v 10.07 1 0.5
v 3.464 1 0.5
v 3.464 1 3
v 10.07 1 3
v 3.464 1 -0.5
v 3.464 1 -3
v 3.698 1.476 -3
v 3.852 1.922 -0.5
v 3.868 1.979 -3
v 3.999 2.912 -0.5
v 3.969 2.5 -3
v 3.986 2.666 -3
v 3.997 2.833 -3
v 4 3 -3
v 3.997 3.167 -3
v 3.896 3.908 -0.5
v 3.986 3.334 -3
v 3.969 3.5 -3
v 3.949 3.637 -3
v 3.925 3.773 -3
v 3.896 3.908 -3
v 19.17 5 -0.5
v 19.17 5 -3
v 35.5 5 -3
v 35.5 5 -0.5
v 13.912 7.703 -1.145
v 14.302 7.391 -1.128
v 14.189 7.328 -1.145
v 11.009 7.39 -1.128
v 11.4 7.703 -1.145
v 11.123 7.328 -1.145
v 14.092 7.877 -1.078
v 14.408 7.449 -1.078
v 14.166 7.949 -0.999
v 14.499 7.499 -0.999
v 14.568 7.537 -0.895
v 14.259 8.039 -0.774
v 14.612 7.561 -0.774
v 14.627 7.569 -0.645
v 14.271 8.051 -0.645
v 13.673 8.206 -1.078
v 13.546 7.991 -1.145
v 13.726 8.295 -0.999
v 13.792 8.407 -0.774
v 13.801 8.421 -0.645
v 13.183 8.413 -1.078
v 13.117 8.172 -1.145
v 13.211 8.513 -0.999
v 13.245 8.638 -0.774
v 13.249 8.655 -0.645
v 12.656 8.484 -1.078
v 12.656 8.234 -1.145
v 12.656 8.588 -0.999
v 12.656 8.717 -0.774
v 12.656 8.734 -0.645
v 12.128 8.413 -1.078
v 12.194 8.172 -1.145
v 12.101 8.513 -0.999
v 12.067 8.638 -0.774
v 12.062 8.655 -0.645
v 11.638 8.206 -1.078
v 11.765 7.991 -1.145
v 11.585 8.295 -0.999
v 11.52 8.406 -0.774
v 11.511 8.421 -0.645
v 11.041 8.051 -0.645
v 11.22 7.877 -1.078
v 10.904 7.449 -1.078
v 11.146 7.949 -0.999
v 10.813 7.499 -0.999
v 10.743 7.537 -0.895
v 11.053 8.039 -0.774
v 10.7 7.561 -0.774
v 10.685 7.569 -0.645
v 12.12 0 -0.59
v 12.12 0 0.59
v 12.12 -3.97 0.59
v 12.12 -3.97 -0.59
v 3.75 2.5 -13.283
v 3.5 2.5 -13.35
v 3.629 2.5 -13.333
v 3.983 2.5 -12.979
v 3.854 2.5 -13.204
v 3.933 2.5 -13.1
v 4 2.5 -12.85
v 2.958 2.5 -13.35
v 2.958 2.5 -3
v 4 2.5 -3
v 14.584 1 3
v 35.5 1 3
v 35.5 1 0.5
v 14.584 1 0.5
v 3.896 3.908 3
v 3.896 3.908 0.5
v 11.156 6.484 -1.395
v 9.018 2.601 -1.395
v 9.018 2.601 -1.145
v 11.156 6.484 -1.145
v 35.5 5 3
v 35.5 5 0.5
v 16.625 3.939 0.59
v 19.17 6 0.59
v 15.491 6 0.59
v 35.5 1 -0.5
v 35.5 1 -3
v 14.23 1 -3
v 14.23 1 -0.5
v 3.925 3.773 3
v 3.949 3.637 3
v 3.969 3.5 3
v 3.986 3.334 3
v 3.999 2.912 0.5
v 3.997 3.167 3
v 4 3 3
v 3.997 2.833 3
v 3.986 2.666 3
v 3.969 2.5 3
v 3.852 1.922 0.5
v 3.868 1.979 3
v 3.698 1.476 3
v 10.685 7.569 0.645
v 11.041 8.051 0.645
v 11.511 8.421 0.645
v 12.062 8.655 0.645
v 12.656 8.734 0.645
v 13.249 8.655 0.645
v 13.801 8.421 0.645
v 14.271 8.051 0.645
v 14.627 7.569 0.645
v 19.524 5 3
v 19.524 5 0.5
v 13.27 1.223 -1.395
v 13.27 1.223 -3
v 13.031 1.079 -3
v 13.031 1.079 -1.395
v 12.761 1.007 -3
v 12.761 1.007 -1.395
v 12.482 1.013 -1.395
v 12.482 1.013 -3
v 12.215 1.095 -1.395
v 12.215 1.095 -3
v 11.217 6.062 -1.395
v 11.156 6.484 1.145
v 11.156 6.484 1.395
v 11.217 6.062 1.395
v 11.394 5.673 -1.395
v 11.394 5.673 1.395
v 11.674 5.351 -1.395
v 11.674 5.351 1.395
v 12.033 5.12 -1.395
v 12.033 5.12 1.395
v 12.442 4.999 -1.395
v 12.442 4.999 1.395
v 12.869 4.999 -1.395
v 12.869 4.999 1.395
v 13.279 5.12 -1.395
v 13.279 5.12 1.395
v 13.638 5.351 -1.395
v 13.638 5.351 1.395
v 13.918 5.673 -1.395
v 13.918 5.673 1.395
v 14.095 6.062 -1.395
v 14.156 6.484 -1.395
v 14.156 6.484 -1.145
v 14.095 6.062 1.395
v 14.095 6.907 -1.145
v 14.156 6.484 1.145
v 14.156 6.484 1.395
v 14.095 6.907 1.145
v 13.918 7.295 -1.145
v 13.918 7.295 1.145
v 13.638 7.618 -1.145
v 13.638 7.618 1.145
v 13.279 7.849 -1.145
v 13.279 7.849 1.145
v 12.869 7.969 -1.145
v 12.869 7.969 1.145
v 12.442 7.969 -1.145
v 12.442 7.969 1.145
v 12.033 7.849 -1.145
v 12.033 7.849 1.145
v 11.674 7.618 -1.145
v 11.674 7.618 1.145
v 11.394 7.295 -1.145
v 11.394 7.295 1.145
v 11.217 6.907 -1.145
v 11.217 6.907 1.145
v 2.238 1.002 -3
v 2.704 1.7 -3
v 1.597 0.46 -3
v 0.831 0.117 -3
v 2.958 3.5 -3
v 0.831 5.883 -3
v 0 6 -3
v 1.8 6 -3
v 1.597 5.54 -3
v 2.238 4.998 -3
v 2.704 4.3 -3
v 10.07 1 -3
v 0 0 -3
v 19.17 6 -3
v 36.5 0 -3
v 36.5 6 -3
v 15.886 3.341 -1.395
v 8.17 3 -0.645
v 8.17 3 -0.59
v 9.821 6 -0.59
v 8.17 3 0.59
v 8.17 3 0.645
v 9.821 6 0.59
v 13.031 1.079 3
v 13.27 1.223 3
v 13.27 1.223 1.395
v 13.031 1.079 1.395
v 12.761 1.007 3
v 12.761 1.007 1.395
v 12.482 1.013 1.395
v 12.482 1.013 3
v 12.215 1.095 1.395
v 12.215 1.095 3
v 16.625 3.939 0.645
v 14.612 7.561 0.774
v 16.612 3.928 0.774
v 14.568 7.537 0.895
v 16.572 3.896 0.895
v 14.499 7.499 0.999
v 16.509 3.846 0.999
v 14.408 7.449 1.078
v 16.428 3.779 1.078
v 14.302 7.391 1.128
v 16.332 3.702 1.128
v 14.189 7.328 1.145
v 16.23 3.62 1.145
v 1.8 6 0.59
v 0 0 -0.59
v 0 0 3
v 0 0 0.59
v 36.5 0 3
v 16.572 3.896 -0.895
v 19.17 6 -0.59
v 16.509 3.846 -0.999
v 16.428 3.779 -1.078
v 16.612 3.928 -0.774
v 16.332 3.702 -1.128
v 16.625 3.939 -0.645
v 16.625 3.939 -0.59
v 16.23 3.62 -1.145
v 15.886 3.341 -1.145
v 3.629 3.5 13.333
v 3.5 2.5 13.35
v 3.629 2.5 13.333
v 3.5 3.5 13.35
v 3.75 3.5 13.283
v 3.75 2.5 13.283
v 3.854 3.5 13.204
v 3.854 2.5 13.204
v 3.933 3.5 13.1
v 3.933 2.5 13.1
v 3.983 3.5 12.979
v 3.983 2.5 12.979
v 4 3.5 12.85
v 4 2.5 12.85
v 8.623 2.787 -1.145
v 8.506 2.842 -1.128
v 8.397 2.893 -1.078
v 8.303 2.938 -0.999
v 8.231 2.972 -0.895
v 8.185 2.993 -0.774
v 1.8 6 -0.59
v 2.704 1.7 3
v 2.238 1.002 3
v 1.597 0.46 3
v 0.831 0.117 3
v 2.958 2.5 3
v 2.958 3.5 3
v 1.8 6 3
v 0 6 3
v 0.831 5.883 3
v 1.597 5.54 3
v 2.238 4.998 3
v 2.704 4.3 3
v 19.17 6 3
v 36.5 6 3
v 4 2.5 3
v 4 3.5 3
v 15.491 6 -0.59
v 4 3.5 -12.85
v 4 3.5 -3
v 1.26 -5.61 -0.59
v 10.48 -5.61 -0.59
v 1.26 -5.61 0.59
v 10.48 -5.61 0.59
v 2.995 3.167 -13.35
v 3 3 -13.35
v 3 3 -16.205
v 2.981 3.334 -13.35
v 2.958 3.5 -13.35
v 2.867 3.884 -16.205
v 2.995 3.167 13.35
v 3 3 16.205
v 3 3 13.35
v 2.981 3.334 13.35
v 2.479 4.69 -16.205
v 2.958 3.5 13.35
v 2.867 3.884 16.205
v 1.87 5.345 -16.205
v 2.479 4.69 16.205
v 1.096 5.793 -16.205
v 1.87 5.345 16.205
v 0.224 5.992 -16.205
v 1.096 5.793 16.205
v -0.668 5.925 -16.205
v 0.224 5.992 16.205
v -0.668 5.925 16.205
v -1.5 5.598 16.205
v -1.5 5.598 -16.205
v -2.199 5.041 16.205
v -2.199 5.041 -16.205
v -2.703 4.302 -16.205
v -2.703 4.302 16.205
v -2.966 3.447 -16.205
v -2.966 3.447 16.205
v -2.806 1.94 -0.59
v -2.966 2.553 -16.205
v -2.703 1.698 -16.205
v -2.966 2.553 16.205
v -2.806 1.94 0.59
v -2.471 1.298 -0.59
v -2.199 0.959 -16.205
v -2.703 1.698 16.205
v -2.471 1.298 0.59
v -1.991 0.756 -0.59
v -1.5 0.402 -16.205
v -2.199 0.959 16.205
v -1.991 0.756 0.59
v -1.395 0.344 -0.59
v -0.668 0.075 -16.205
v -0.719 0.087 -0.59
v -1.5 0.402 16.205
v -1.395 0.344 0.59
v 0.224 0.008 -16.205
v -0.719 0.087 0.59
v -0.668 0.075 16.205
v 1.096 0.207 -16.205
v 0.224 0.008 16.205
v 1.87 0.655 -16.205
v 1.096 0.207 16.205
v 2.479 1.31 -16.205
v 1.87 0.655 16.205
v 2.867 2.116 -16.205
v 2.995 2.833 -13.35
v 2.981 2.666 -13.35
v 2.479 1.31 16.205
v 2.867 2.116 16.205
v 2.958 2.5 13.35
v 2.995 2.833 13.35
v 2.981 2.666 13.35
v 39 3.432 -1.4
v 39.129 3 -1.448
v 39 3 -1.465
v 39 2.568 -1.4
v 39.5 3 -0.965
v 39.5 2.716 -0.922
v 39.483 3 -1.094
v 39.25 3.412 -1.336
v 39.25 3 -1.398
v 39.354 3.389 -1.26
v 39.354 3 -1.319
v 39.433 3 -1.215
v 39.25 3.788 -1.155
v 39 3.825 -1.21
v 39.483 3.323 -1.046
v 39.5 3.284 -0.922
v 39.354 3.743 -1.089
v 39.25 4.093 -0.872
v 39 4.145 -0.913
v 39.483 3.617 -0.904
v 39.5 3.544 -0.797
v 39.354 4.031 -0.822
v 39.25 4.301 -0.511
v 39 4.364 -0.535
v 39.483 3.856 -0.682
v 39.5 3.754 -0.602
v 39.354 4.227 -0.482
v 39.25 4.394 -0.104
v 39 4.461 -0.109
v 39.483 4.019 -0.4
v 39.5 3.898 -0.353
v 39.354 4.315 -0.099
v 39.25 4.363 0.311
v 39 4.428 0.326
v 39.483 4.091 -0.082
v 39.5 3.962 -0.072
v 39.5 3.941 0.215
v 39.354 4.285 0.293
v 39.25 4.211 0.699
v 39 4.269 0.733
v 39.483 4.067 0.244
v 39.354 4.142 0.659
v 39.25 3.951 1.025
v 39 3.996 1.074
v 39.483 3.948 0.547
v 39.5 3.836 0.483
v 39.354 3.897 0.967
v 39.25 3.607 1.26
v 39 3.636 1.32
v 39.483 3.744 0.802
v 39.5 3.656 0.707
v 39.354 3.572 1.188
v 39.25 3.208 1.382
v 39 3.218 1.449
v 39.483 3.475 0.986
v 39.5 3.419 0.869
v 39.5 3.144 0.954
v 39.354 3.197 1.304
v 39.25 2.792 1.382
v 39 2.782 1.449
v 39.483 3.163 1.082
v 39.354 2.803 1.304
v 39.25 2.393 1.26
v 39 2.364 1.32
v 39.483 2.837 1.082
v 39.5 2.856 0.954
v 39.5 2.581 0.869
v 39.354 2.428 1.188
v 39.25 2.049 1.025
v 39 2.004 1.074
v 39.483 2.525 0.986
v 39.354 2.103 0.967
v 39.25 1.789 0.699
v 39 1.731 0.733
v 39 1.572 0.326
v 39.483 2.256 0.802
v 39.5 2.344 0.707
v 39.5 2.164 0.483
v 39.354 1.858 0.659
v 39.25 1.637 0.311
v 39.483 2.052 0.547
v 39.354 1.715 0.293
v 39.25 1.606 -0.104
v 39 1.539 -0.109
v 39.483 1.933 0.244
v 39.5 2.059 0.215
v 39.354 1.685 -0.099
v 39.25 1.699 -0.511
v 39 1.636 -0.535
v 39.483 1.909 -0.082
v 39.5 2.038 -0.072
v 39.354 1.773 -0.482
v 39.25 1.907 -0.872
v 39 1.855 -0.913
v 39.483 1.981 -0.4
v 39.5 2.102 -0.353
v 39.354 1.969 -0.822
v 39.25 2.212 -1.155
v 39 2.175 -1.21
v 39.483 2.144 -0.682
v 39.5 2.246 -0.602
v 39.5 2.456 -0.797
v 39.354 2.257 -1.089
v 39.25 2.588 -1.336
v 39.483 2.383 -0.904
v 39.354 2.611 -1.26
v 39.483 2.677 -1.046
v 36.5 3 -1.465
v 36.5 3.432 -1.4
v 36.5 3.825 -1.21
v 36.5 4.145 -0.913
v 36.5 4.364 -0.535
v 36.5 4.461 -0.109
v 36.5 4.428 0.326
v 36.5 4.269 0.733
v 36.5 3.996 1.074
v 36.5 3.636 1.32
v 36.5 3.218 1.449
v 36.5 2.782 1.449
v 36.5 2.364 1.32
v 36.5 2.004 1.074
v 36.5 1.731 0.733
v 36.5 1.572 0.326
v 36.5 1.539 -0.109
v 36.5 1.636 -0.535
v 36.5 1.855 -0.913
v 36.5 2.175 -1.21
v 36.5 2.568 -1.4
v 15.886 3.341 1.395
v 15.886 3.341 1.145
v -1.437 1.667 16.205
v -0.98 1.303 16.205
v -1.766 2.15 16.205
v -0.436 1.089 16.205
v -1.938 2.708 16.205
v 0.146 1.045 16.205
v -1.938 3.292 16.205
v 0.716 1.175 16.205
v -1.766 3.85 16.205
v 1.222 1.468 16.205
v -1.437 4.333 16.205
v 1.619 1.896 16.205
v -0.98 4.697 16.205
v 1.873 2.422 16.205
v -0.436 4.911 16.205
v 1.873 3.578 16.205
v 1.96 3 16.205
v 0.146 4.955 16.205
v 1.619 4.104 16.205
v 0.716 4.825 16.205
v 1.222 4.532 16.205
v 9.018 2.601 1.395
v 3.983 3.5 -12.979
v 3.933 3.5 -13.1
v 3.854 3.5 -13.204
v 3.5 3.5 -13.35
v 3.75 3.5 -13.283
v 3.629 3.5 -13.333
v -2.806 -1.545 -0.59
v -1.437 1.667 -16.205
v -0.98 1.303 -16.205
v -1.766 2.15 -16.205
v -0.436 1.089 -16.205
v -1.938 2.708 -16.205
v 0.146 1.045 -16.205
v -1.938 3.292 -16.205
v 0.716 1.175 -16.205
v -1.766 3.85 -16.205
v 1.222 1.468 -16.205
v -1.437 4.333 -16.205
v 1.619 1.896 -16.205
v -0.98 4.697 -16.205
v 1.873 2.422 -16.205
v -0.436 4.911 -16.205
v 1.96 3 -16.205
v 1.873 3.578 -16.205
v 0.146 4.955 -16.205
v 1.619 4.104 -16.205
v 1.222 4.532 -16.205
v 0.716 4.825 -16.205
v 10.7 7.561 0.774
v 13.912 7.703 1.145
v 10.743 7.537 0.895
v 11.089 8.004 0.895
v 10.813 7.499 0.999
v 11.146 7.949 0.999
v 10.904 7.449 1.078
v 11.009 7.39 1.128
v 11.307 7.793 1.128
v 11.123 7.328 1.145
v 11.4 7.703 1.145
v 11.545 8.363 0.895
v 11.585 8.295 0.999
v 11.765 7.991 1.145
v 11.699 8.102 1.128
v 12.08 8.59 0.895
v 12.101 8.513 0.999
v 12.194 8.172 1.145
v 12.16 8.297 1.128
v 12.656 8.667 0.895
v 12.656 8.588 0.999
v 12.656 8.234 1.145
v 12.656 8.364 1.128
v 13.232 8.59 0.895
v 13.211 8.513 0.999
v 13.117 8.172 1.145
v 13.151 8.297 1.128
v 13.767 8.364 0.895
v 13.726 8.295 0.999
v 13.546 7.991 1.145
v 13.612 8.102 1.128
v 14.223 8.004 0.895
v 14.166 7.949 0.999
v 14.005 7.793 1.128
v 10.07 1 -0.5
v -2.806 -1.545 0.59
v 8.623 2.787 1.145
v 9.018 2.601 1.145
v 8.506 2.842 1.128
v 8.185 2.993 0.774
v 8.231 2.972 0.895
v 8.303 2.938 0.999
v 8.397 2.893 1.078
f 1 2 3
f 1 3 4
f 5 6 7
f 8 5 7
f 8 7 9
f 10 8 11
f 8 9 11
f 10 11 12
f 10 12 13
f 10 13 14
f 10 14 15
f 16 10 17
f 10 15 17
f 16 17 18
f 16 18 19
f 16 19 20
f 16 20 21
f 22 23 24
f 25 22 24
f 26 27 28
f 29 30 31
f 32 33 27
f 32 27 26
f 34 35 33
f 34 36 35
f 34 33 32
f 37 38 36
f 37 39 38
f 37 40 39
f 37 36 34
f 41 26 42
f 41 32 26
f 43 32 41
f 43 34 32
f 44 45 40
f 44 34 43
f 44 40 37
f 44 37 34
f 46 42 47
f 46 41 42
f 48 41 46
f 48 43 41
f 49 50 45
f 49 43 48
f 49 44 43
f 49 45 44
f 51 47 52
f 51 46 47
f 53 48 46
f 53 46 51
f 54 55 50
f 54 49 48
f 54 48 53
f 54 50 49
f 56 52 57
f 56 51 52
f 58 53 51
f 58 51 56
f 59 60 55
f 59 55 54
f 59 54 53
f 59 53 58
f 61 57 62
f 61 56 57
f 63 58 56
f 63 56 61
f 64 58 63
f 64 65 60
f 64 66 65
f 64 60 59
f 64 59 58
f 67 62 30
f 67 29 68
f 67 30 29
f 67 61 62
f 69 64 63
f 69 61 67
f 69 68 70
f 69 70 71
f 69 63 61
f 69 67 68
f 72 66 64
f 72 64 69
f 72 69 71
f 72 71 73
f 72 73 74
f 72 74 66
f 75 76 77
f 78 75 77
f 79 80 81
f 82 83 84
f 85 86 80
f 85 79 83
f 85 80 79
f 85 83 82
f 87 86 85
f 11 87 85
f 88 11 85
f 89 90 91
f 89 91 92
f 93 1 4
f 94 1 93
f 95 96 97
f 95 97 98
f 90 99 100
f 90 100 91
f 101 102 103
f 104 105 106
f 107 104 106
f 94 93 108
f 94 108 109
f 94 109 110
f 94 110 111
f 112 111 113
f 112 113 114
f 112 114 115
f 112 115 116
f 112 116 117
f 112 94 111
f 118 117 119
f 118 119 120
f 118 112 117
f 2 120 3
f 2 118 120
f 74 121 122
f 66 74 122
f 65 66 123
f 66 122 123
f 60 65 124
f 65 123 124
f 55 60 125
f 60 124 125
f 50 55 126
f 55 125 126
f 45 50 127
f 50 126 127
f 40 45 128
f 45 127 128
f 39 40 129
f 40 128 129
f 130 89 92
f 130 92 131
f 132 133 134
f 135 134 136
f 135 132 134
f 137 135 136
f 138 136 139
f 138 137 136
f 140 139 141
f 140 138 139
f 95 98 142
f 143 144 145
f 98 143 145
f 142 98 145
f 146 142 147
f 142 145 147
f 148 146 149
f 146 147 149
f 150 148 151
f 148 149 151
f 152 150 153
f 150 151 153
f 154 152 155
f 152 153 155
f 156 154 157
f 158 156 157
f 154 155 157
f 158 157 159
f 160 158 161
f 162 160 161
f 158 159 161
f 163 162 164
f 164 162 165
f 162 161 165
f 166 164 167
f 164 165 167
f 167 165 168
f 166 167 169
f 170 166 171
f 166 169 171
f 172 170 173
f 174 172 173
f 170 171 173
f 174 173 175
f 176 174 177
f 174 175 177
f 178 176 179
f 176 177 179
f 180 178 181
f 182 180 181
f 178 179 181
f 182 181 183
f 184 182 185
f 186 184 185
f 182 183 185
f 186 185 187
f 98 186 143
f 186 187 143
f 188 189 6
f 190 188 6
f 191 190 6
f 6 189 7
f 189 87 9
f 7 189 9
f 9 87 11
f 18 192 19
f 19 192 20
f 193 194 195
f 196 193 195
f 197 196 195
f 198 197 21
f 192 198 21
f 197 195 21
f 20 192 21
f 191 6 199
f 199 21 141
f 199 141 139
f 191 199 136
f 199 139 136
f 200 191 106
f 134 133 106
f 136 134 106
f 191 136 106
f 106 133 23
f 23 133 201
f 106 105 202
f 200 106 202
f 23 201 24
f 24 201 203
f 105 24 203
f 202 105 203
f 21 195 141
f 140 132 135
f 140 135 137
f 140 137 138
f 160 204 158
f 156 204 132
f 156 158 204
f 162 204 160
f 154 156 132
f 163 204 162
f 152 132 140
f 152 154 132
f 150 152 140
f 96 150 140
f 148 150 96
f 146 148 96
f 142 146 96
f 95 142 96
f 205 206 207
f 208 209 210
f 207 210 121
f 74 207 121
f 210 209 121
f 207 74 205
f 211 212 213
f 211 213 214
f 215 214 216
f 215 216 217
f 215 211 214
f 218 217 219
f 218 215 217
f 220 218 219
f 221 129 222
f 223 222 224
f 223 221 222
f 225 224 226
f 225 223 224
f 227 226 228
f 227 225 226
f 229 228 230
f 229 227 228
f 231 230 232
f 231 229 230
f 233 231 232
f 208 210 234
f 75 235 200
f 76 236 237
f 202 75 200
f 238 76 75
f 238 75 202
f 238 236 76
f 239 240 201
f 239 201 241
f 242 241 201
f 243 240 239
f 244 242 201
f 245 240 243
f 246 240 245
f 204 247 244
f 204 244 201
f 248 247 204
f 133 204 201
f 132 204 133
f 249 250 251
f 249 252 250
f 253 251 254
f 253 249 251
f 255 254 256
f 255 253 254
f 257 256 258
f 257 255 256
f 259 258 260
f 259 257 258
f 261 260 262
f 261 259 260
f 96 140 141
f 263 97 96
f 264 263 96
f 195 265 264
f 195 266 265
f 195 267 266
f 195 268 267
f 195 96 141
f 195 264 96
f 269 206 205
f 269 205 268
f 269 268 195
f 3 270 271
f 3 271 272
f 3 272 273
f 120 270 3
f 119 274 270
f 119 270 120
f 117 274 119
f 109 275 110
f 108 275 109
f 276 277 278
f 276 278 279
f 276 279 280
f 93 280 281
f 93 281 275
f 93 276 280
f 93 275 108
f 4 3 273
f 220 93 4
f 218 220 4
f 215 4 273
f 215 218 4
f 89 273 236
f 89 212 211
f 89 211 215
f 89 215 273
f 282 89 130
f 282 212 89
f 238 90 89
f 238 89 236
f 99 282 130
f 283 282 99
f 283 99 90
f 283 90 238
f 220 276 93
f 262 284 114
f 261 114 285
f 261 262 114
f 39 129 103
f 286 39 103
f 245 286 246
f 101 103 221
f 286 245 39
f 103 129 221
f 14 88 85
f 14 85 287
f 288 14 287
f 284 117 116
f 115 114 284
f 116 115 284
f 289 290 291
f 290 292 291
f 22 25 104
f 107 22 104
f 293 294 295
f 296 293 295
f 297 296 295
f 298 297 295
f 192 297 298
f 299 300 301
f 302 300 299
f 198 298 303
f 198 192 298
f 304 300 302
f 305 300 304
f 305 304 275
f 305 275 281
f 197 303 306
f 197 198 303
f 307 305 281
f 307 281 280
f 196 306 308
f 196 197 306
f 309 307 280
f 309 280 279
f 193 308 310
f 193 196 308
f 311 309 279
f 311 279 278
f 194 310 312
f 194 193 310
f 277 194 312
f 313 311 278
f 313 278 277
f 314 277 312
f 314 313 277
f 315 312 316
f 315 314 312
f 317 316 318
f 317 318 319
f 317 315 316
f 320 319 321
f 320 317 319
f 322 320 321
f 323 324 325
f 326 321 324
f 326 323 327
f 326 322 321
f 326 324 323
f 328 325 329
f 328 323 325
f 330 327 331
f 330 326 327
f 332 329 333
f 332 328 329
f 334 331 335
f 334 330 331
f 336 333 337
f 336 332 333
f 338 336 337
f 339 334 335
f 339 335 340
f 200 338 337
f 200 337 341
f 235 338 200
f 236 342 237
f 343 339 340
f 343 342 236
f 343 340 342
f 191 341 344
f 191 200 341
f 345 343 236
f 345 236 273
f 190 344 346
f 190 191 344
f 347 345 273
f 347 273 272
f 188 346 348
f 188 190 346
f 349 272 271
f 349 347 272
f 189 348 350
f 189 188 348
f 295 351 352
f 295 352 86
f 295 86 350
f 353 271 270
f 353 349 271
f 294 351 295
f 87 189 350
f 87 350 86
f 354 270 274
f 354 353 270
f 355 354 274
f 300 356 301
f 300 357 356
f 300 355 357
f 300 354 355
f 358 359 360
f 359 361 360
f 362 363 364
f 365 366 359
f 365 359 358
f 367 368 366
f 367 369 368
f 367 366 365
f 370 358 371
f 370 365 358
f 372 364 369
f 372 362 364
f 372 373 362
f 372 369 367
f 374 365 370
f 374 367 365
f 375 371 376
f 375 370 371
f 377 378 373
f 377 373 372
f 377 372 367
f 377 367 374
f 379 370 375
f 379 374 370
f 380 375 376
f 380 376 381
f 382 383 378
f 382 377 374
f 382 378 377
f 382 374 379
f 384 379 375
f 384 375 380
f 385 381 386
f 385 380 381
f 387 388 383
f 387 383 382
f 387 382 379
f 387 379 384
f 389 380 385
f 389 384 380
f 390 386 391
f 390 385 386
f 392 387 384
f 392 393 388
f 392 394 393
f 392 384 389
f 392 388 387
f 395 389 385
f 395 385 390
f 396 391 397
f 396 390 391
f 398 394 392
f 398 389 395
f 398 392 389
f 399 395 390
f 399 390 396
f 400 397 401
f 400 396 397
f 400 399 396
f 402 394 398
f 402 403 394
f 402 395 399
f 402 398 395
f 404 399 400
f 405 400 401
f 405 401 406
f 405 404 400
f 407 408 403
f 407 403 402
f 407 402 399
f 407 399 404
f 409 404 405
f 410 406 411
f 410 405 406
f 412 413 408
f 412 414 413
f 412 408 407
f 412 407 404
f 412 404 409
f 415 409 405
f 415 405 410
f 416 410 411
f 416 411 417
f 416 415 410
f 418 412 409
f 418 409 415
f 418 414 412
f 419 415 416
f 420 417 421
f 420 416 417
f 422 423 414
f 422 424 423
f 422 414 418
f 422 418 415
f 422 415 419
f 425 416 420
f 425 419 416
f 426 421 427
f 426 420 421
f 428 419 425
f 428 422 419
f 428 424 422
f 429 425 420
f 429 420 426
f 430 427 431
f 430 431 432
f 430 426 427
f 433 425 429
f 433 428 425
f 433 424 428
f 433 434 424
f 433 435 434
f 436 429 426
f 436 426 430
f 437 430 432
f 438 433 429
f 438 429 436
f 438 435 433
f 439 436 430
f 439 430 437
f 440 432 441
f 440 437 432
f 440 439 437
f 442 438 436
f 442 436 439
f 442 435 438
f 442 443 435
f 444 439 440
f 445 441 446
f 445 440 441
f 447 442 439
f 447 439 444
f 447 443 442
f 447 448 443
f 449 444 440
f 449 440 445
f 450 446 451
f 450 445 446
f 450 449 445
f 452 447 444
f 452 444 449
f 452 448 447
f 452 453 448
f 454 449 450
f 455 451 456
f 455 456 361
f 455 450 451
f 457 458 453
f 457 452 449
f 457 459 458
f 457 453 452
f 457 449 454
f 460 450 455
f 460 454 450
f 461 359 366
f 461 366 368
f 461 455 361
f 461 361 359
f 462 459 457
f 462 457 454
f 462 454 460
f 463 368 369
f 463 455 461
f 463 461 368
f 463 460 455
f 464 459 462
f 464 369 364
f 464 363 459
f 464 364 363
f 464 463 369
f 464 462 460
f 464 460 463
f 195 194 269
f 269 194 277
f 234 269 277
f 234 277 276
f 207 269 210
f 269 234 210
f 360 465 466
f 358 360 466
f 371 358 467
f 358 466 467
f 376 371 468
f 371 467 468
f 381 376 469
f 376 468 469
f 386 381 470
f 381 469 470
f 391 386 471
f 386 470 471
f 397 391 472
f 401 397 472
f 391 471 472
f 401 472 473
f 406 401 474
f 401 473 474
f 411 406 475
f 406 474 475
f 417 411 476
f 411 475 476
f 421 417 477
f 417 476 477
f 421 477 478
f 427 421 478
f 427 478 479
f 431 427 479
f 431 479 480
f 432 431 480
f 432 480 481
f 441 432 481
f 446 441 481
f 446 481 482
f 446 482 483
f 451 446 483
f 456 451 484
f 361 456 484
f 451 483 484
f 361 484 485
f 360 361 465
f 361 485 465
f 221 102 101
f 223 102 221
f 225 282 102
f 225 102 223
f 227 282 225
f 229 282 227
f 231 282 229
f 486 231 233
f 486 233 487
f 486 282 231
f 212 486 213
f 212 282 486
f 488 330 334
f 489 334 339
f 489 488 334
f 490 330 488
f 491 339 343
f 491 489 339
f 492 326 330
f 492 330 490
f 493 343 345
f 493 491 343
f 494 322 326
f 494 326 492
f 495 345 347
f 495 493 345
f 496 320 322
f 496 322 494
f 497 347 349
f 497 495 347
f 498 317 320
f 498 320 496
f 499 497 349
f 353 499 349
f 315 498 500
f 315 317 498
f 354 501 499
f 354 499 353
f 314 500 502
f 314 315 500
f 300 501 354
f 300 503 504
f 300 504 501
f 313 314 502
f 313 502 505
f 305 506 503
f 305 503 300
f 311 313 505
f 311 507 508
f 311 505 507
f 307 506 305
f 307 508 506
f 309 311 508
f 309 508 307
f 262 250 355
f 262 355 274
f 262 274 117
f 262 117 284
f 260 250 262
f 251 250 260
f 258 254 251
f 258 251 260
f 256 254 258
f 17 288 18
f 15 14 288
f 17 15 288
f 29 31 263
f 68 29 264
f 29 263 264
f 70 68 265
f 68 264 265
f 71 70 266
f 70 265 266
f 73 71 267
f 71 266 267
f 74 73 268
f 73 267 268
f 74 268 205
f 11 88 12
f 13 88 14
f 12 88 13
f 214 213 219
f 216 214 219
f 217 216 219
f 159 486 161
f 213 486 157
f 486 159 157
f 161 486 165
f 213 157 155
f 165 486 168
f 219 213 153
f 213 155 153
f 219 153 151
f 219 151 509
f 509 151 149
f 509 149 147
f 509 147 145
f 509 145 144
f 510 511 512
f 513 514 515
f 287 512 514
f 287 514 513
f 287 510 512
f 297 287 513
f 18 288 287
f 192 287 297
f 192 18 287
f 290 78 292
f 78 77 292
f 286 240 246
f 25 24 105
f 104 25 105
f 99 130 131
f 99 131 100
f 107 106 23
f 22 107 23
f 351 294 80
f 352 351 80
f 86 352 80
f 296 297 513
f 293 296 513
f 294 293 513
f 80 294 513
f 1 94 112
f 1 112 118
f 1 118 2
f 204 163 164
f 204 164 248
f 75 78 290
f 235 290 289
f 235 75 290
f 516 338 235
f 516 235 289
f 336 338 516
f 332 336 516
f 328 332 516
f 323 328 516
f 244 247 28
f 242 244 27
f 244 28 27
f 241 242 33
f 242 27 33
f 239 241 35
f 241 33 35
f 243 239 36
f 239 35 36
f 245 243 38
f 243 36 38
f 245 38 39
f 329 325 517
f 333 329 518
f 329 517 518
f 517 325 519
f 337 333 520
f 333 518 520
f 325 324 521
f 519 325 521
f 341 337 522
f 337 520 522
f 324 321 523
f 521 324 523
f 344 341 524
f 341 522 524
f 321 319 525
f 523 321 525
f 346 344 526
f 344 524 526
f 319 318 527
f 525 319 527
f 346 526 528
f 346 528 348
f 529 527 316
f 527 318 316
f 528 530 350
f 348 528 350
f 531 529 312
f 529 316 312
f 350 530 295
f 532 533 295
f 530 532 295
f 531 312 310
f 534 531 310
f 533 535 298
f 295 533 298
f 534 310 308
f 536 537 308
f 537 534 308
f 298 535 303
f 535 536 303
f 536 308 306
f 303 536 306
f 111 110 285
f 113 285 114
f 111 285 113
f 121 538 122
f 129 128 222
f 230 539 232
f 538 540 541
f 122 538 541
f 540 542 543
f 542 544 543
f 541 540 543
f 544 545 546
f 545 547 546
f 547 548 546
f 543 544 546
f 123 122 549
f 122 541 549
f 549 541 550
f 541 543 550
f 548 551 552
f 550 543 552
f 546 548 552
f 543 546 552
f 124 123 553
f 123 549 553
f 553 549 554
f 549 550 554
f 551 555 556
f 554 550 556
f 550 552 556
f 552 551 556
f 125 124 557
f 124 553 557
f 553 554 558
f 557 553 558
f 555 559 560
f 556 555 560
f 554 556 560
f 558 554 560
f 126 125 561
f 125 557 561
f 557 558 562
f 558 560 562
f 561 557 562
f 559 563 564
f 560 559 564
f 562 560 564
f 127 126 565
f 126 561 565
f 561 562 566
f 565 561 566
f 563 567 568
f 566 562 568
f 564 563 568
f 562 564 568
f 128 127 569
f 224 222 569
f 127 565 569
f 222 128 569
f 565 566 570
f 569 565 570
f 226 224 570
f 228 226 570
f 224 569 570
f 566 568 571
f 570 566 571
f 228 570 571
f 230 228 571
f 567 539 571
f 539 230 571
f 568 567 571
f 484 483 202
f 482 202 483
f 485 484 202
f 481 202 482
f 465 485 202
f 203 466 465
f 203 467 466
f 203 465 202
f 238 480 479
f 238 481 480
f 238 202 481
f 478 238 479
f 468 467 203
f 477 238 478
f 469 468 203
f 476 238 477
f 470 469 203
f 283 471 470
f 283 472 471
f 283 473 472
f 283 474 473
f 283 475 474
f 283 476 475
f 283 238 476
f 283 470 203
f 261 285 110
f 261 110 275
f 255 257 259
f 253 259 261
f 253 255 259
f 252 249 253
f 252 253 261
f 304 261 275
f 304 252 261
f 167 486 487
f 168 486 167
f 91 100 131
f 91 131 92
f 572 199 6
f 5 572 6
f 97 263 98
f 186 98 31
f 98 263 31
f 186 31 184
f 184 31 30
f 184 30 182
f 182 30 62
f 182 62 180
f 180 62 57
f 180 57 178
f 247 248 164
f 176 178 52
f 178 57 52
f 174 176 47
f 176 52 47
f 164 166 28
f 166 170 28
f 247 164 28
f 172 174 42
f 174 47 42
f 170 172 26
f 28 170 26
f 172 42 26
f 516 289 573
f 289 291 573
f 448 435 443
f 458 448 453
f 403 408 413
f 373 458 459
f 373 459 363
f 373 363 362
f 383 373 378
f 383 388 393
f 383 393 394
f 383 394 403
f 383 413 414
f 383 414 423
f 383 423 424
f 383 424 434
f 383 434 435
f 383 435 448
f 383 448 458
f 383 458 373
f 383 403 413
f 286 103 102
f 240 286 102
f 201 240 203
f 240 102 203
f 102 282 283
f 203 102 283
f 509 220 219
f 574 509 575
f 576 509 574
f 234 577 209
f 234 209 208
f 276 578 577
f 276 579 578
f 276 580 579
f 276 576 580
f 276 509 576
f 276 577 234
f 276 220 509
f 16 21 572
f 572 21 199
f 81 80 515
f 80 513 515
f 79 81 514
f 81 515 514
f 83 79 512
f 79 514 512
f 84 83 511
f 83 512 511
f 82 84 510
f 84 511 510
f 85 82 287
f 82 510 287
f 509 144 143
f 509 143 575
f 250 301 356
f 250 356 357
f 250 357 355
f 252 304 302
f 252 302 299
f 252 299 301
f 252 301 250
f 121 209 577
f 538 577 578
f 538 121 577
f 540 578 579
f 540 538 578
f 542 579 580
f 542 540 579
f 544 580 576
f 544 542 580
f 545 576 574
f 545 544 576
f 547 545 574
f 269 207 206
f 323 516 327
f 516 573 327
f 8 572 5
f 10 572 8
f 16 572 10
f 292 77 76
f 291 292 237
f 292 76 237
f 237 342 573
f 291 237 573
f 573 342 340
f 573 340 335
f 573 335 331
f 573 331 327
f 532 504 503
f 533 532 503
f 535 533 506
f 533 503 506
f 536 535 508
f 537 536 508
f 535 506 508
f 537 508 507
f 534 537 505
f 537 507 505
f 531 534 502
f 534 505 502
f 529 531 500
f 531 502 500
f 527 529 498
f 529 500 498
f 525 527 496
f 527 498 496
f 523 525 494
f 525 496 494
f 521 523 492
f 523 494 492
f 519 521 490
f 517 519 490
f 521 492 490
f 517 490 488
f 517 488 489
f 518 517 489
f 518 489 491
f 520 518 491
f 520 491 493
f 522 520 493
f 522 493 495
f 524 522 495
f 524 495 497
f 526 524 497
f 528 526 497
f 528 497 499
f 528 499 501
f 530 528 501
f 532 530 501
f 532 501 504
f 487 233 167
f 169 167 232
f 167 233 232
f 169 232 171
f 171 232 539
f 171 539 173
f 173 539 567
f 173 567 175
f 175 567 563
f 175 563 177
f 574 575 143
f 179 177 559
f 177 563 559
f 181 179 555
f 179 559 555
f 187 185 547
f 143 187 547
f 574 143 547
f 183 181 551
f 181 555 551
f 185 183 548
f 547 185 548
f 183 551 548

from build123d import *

# Parameters (mm, degrees)
BOSS_EXTRUDE3_DEPTH  = 3
SKETCH2_R            = 2.9999999999999982
BOSS_EXTRUDE4_DEPTH  = 16.205
SKETCH5_R            = 1.96
CUT_EXTRUDE2_DEPTH   = 32.80000000000002
SKETCH6_R            = 1.465
BOSS_EXTRUDE7_DEPTH  = 3
FILLET1_R            = 0.5
BOSS_EXTRUDE8_DEPTH  = 0.59
BOSS_EXTRUDE9_DEPTH  = 13.35
FILLET7_R            = 0.5
FILLET8_R            = 0.5
BOSS_EXTRUDE10_DEPTH = 3
CUT_EXTRUDE4_DEPTH   = 3
BOSS_EXTRUDE11_DEPTH = 0.59
BOSS_EXTRUDE12_DEPTH = 1.395
CUT_EXTRUDE6_DEPTH   = 20.895000000000014
CUT_EXTRUDE7_DEPTH   = 0.25
CUT_EXTRUDE8_DEPTH   = 0.25
FILLET9_R            = 0.5
FILLET10_R           = 0.5
CUT_EXTRUDE9_DEPTH   = 2.5
CUT_EXTRUDE10_DEPTH  = 2.5
CUT_EXTRUDE12_DEPTH  = 2.5
CUT_EXTRUDE14_START  = -2.5
CUT_EXTRUDE14_DEPTH  = 2.5


with BuildPart() as part:
    # Sketch1 → Boss-Extrude3 (new, symmetric)
    with BuildSketch(Plane.XY):
        with BuildLine():
            ThreePointArc((2.9999999999999982, 2.9999999999999973), (2.1213203435596406, 0.8786796564403563), (-5.5e-16, 0))
            Line((0, 0), (36.5, 0))
            Line((36.5, 0), (36.5, 6))
            Line((36.5, 6), (20.749999999999996, 5.999999999999999))
            ThreePointArc((20.749999999999996, 5.999999999999999), (20.435386233554034, 4.445031090493969), (19.54103584523481, 3.134669493650969))
            ThreePointArc((19.54103584523481, 3.1346694936509705), (17.593985916344508, 2.2872332130112563), (15.573673818645423, 2.9410609450836516))
            Line((15.573673818645423, 2.9410609450836516), (11.749999999999998, 5.9999999999999964))
            Line((11.749999999999998, 5.9999999999999964), (0, 5.9999999999999964))
            ThreePointArc((1.8e-16, 5.9999999999999964), (2.1213203435596415, 5.121320343559639), (2.9999999999999982, 2.9999999999999982))
        make_face()
    extrude(amount=BOSS_EXTRUDE3_DEPTH, both=True)

    # Sketch2 → Boss-Extrude4 (add, symmetric)
    with BuildSketch(Plane.XY):
        with Locations((0, 2.9999999999999982)):
            Circle(SKETCH2_R)
    extrude(amount=BOSS_EXTRUDE4_DEPTH, both=True)

    # Sketch5 → Cut-Extrude2 (cut)
    with BuildSketch(Plane.XY.offset(16.205)):
        with Locations((0, 2.9999999999999982)):
            Circle(SKETCH5_R)
    extrude(amount=-CUT_EXTRUDE2_DEPTH, mode=Mode.SUBTRACT)

    # Sketch6 → Boss-Extrude7 (add)
    with BuildSketch(Plane(origin=(36.5, 0, 0), x_dir=(0, 0, -1), z_dir=(1, 0, 0))):
        with Locations((0, 2.999999999999999)):
            Circle(SKETCH6_R)
    extrude(amount=BOSS_EXTRUDE7_DEPTH)

    # Fillet1
    fillet1_edges = [part.edges().sort_by_distance(p)[0] for p in [
        (39.5, 2.9999999999999987, 1.465),
    ]]
    fillet(fillet1_edges, radius=FILLET1_R)

    # Sketch12 → Boss-Extrude8 (add, symmetric)
    with BuildSketch(Plane.XY):
        with BuildLine():
            Line((12.12, -2.99e-15), (12.12, -3.970000000000003))
            Line((12.12, -3.970000000000003), (10.479512267647207, -5.6104877323527935))
            Line((10.479512267647207, -5.6104877323527935), (1.2595122676472073, -5.610487732352795))
            Line((1.2595122676472073, -5.610487732352795), (-2.8063517241754403, -1.5446237405301462))
            Line((-2.8063517241754403, -1.5446237405301462), (-2.8063517241754403, 1.939627423865778))
            ThreePointArc((-2.8063517241754403, 1.939627423865778), (-1.7057083970593148, 0.5320942351456543), (0, 0))
            Line((0, 0), (12.12, -2.99e-15))
        make_face()
    extrude(amount=BOSS_EXTRUDE8_DEPTH, both=True)

    # Sketch14 → Boss-Extrude9 (add, symmetric)
    with BuildSketch(Plane.XY):
        with BuildLine():
            Line((3.9999999999999982, 2.4999999999999982), (3.9999999999999982, 3.4999999999999982))
            Line((3.9999999999999982, 3.4999999999999982), (2.9580398915498067, 3.4999999999999982))
            ThreePointArc((2.9580398915498067, 3.4999999999999982), (2.999999999999999, 2.9999999999999982), (2.9580398915498067, 2.4999999999999982))
            Line((2.9580398915498067, 2.4999999999999982), (3.9999999999999982, 2.4999999999999982))
        make_face()
    extrude(amount=BOSS_EXTRUDE9_DEPTH, both=True)

    # Fillet7
    fillet7_edges = [part.edges().sort_by_distance(p)[0] for p in [
        (3.9999999999999982, 2.9999999999999982, 13.35),
    ]]
    fillet(fillet7_edges, radius=FILLET7_R)

    # Fillet8
    fillet8_edges = [part.edges().sort_by_distance(p)[0] for p in [
        (3.9999999999999982, 2.9999999999999982, -13.35),
    ]]
    fillet(fillet8_edges, radius=FILLET8_R)

    # Sketch15 → Boss-Extrude10 (add, symmetric)
    with BuildSketch(Plane.XY):
        Polygon((5.875, 5.9999999999999964), (27.07720850874597, 5.999999999999999), (27.07720850874597, 1.48970114733157), (5.875, 1.48970114733157), align=None)
    extrude(amount=BOSS_EXTRUDE10_DEPTH, both=True)

    # Sketch16 → Cut-Extrude4 (cut, symmetric)
    with BuildSketch(Plane.XY):
        with BuildLine():
            ThreePointArc((13.27019347571673, 1.2228284271177183), (12.760871493283885, 1.00722209344764), (12.214852275986694, 1.0953015306060352))
            Line((12.214852275986694, 1.0953015306060352), (1.8, 6))
            Line((1.8, 6), (19.169999999999998, 6.000000000000002))
            Line((19.169999999999998, 6.000000000000002), (13.27019347571673, 1.2228284271177183))
        make_face()
    extrude(amount=CUT_EXTRUDE4_DEPTH, both=True, mode=Mode.SUBTRACT)

    # Sketch17 → Boss-Extrude11 (add, symmetric)
    with BuildSketch(Plane.XY):
        Polygon((1.8, 6), (19.169999999999998, 5.999999999999999), (19.169999999999998, 0.49690997030879536), (1.8, 0.49690997030879536), (4.890483943976141, 2.396162656787146), align=None)
    extrude(amount=BOSS_EXTRUDE11_DEPTH, both=True)

    # Sketch19 → Boss-Extrude12 (add, symmetric)
    with BuildSketch(Plane.XY):
        with BuildLine():
            Line((8.17, 3.000156274700533), (10.684653005804094, 7.569117176028711))
            ThreePointArc((10.684653005804094, 7.569117176028711), (12.655773390851454, 8.734228825048191), (14.626946759842125, 7.569206818212221))
            Line((14.626946759842125, 7.569206818212221), (15.490695774172368, 5.999999999999999))
            Line((15.490695774172368, 5.999999999999999), (16.624997623308392, 3.9392692019970994))
            Line((16.624997623308392, 3.9392692019970994), (13.27019347571673, 1.2228284271177192))
            ThreePointArc((13.27019347571673, 1.2228284271177192), (12.760871493283883, 1.0072220934476446), (12.21485227598669, 1.0953015306060374))
            Line((12.21485227598669, 1.0953015306060374), (8.17, 3.000156274700533))
        make_face()
    extrude(amount=BOSS_EXTRUDE12_DEPTH, both=True)

    # Sketch20 → Cut-Extrude6 (cut, symmetric)
    with BuildSketch(Plane.XY.offset(1.395)):
        with BuildLine():
            ThreePointArc((14.155824552668768, 6.484228825629862), (12.655824552668768, 7.984228825629863), (11.155824552668768, 6.484228825629862))
            ThreePointArc((11.15582455266877, 6.484228825629865), (12.655824552668765, 4.984228825629861), (14.155824552668767, 6.484228825629859))
        make_face()
    extrude(amount=CUT_EXTRUDE6_DEPTH, both=True, mode=Mode.SUBTRACT)

    # Sketch21 → Cut-Extrude7 (cut, symmetric)
    with BuildSketch(Plane.XY.offset(1.395)):
        with BuildLine():
            Line((11.155824552668768, 6.484228825629862), (9.018377782257767, 2.60062711193924))
            Line((9.018377782257767, 2.60062711193924), (8.17, 3.000156274700535))
            Line((8.17, 3.000156274700535), (10.684653005804092, 7.569117176028711))
            ThreePointArc((10.684653005804092, 7.569117176028711), (12.655773390851452, 8.734228825048183), (14.626946759842125, 7.569206818212221))
            Line((14.626946759842125, 7.569206818212221), (16.62499762330839, 3.9392692019970985))
            Line((16.62499762330839, 3.9392692019970985), (15.886023032964967, 3.3409091724705715))
            Line((15.886023032964967, 3.3409091724705715), (14.155824552668767, 6.484228825629862))
            ThreePointArc((14.155824552668767, 6.484228825629862), (12.655824552668768, 4.984228825629862), (11.155824552668768, 6.484228825629862))
        make_face()
    extrude(amount=CUT_EXTRUDE7_DEPTH, both=True, mode=Mode.SUBTRACT)

    # Sketch22 → Cut-Extrude8 (cut, symmetric)
    with BuildSketch(Plane(origin=(0, 0, -1.395), x_dir=(-1, 0, 0), z_dir=(0, 0, -1))):
        with BuildLine():
            Line((-14.155824552668767, 6.484228825629862), (-15.886023032964967, 3.340909172470571))
            Line((-15.886023032964967, 3.340909172470571), (-16.624997623308392, 3.9392692019971034))
            Line((-16.624997623308392, 3.9392692019971034), (-14.626946759842125, 7.569206818212221))
            ThreePointArc((-14.626946759842125, 7.569206818212221), (-12.655773390851454, 8.73422882504819), (-10.684653005804092, 7.569117176028711))
            Line((-10.684653005804092, 7.569117176028711), (-8.17, 3.000156274700535))
            Line((-8.17, 3.000156274700535), (-9.018377782257769, 2.600627111939241))
            Line((-9.018377782257769, 2.600627111939241), (-11.155824552668768, 6.484228825629862))
            ThreePointArc((-11.155824552668768, 6.484228825629862), (-12.655824552668768, 4.984228825629864), (-14.155824552668767, 6.484228825629862))
        make_face()
    extrude(amount=CUT_EXTRUDE8_DEPTH, both=True, mode=Mode.SUBTRACT)

    # Fillet9
    fillet9_edges = [part.edges().sort_by_distance(p)[0] for p in [
        (15.625972191575258, 5.754238010104662, -1.145),
        (12.655773390851452, 8.73422882504819, -1.145),
        (9.427326502902046, 5.2846367253646225, -1.145),
    ]]
    fillet(fillet9_edges, radius=FILLET9_R)

    # Fillet10
    fillet10_edges = [part.edges().sort_by_distance(p)[0] for p in [
        (9.427326502902046, 5.2846367253646225, 1.145),
        (12.655773390851452, 8.734228825048183, 1.145),
        (15.625972191575258, 5.754238010104659, 1.145),
    ]]
    fillet(fillet10_edges, radius=FILLET10_R)

    # Sketch23 → Cut-Extrude9 (cut)
    with BuildSketch(Plane(origin=(0, 0, -3), x_dir=(-1, 0, 0), z_dir=(0, 0, -1))):
        Polygon((-35.5, 5), (-35.5, 1), (-14.230000308321648, 1), (-19.169999999999998, 5), align=None)
    extrude(amount=-CUT_EXTRUDE9_DEPTH, mode=Mode.SUBTRACT)

    # Sketch24 → Cut-Extrude10 (cut)
    with BuildSketch(Plane(origin=(0, 0, -3), x_dir=(-1, 0, 0), z_dir=(0, 0, -1))):
        with BuildLine():
            Line((-10.07009080824153, 1), (-3.4641016151377535, 1))
            ThreePointArc((-3.4641016151377535, 1), (-3.9566645904895195, 2.412798741174382), (-3.895636139676663, 3.9077549599121406))
            Line((-3.895636139676663, 3.9077549599121406), (-10.07009080824153, 1))
        make_face()
    extrude(amount=-CUT_EXTRUDE10_DEPTH, mode=Mode.SUBTRACT)

    # Sketch25 → Cut-Extrude12 (cut)
    with BuildSketch(Plane.XY.offset(3)):
        Polygon((19.524095671942906, 5), (35.5, 5), (35.5, 1), (14.584095980264548, 0.9999999999999983), align=None)
    extrude(amount=-CUT_EXTRUDE12_DEPTH, mode=Mode.SUBTRACT)

    # Sketch26 → Cut-Extrude14 (cut)
    with BuildSketch(Plane.XY.offset(3).offset(CUT_EXTRUDE14_START)):
        with BuildLine():
            Line((3.4641016151377535, 1), (10.070090808241538, 1))
            Line((10.070090808241538, 1), (3.8956361396766637, 3.9077549599121406))
            ThreePointArc((3.8956361396766637, 3.9077549599121406), (3.956664590489521, 2.4127987411743836), (3.4641016151377535, 1))
        make_face()
    extrude(amount=CUT_EXTRUDE14_DEPTH, mode=Mode.SUBTRACT)


solid = part.part
